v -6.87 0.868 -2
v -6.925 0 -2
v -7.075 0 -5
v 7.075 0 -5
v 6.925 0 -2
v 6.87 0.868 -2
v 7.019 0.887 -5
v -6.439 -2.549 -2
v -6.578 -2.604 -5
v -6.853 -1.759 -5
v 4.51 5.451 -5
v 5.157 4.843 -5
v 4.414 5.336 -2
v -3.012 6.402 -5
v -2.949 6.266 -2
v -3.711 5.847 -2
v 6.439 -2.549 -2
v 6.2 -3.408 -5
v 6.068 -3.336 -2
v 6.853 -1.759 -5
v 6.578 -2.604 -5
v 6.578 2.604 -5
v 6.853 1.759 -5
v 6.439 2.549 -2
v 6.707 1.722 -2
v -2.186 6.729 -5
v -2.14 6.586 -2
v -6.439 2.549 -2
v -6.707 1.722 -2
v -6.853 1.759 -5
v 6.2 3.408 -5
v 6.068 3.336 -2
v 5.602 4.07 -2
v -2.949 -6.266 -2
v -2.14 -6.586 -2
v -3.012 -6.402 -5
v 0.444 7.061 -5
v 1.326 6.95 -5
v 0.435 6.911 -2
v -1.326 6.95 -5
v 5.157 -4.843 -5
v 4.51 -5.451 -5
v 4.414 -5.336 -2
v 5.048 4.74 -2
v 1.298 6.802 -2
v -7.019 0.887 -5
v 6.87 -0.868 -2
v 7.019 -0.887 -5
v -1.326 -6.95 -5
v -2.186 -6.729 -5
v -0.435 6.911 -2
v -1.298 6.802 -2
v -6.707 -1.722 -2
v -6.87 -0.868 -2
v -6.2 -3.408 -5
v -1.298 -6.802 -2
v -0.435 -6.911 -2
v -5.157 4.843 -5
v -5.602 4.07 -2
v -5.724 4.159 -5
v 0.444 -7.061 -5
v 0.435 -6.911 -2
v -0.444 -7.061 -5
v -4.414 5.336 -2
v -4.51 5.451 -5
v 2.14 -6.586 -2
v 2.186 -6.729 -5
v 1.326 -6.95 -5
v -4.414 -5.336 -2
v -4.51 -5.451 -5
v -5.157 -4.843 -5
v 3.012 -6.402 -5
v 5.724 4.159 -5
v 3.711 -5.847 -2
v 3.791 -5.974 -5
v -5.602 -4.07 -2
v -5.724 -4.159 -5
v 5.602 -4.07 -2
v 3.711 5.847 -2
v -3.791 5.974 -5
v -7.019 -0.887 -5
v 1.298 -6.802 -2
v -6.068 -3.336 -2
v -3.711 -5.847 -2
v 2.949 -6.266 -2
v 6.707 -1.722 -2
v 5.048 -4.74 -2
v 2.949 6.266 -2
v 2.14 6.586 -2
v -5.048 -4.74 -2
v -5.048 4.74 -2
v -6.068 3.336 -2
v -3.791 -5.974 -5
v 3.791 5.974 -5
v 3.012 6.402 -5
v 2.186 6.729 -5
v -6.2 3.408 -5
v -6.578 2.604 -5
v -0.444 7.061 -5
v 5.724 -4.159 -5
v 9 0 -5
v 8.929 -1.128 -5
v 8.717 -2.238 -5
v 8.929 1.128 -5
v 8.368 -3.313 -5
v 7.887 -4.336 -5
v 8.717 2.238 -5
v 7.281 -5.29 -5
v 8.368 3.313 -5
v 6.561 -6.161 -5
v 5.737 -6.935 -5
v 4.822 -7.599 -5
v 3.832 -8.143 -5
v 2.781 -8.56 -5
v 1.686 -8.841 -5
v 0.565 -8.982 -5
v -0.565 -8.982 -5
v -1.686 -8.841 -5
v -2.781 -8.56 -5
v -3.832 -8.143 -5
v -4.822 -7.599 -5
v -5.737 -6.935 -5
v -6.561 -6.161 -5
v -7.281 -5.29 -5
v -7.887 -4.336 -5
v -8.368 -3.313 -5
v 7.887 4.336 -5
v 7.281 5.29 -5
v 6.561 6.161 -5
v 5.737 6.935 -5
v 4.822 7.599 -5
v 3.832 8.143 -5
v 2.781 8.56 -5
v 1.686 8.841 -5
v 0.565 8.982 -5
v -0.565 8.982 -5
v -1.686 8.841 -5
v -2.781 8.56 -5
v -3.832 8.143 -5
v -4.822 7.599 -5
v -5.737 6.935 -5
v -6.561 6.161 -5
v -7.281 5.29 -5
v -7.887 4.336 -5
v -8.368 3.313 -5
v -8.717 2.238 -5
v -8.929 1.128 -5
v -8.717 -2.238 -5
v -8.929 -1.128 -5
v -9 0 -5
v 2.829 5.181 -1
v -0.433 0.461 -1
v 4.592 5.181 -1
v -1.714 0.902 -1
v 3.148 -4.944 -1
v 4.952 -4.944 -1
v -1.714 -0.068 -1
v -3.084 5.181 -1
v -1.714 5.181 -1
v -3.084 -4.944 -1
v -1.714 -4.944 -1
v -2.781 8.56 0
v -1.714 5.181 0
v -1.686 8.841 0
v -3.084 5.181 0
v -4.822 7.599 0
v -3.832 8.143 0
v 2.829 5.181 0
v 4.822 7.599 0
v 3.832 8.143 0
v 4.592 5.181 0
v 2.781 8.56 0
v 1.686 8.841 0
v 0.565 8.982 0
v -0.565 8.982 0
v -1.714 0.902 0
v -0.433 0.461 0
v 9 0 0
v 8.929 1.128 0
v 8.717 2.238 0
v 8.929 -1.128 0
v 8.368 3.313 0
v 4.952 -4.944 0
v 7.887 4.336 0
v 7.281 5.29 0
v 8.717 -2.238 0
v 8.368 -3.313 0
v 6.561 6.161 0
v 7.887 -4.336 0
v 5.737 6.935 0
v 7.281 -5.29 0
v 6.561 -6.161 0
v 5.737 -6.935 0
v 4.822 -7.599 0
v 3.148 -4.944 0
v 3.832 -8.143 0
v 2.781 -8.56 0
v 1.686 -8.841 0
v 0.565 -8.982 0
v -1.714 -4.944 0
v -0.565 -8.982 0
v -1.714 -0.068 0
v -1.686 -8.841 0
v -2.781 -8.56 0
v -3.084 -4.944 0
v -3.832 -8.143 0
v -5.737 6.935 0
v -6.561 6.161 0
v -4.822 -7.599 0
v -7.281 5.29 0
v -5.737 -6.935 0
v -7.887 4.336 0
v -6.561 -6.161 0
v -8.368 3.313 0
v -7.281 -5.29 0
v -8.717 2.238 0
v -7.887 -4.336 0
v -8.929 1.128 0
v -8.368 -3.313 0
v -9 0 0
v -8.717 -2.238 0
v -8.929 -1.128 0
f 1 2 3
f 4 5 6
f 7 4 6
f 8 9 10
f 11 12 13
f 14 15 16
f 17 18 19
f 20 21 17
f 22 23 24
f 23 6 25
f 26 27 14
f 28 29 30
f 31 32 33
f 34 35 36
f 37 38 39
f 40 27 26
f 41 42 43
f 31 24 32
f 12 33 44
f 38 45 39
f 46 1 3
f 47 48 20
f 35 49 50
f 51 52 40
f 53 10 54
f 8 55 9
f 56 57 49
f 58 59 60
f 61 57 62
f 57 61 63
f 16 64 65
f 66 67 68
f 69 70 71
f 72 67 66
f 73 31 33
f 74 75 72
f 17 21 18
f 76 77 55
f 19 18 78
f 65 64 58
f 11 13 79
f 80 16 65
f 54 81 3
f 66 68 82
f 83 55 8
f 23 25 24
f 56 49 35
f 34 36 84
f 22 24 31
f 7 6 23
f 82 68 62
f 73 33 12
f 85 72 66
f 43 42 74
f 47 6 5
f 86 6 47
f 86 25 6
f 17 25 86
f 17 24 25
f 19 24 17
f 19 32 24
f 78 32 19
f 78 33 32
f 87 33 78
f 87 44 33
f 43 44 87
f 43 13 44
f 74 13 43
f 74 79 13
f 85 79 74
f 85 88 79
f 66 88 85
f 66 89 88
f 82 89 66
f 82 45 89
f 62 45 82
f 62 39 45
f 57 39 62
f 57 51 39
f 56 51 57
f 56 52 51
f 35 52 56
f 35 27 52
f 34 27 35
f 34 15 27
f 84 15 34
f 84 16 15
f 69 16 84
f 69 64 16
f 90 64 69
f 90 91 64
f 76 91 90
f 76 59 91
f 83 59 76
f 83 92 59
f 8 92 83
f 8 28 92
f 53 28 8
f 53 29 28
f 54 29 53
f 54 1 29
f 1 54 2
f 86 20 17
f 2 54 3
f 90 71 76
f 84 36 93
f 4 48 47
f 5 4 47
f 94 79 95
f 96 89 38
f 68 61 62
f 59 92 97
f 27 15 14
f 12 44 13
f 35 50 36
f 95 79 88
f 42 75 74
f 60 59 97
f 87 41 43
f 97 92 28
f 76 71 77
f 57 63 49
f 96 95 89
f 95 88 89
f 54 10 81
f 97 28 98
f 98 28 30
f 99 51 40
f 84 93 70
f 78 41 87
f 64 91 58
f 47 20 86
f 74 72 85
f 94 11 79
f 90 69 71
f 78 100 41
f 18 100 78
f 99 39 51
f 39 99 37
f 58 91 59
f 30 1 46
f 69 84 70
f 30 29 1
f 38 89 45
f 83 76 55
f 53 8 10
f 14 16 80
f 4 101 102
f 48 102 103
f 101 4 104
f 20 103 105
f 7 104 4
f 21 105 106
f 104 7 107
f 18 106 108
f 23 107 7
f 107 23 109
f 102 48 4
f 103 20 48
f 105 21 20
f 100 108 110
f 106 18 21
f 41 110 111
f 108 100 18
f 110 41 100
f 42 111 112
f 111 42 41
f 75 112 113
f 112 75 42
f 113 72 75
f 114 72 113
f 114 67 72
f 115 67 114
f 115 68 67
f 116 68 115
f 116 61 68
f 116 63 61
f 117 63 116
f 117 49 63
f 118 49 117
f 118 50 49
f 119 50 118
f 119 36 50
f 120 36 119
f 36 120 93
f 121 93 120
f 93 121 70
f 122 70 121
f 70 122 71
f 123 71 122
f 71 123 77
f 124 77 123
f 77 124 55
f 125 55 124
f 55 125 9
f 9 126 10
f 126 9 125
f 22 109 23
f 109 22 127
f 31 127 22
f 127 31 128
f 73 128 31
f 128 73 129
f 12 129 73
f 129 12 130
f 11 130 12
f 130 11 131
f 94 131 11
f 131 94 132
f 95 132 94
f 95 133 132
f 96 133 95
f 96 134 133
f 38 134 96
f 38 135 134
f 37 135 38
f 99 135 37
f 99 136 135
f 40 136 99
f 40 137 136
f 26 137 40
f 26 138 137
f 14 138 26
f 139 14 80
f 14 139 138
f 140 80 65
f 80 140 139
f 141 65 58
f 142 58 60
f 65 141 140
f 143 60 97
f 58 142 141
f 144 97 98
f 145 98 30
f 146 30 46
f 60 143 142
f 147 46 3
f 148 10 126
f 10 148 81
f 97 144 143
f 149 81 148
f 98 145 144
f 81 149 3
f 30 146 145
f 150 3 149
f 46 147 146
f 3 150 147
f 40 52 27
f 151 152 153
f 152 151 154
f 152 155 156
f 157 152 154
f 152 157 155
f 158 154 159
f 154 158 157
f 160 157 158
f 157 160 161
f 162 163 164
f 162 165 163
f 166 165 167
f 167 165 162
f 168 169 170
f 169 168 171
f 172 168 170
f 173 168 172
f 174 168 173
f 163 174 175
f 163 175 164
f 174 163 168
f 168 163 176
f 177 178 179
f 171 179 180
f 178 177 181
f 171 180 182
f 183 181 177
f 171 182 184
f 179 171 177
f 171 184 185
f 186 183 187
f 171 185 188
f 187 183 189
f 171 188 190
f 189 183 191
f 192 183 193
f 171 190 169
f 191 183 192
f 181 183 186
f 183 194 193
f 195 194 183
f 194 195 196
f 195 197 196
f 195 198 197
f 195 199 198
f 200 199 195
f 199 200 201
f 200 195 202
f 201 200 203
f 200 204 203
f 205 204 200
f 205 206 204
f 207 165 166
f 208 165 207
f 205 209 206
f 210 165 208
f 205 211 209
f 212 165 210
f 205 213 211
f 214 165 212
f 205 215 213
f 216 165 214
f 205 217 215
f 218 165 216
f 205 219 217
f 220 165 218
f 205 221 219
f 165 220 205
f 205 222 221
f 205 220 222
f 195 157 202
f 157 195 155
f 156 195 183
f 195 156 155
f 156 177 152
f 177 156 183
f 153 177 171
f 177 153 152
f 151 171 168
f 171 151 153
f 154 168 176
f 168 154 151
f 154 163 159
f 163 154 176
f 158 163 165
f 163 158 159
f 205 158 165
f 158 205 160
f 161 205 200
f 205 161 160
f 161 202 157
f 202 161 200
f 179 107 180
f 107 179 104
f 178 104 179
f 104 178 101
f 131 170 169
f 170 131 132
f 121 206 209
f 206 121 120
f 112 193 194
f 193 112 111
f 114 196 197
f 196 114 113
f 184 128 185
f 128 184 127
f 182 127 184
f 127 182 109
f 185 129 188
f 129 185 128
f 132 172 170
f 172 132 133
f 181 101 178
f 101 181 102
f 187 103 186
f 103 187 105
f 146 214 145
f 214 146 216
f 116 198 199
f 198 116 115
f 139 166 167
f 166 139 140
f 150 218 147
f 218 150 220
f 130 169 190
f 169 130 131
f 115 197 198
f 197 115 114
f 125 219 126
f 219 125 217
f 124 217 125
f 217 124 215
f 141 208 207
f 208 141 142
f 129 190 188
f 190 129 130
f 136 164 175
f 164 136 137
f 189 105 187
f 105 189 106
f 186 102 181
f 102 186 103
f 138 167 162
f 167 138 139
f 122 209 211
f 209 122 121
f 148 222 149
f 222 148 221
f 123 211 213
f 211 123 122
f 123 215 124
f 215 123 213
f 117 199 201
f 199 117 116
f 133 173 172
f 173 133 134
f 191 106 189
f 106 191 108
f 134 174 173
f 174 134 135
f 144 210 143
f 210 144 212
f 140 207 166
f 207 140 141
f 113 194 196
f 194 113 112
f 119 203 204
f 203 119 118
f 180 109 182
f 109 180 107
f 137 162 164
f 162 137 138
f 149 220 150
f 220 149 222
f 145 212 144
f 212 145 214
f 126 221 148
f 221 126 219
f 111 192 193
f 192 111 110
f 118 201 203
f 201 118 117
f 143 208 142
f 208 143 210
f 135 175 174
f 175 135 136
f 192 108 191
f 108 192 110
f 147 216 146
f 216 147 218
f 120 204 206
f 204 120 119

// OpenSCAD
$fn = 50;

difference() {
	union() {
		translate(v = [0, 0, -5.0]) {
			cylinder(h = 5, r = 9.0);
		}
	}
	union() {
		#translate(v = [0, 0, -5.0]) {
			cylinder(h = 3, r1 = 7.075, r2 = 6.925);
		}
		translate(v = [0, 0, -1]) {
			linear_extrude(height = 1) {
				text(font = "Impact", halign = "center", size = 10, text = "K", valign = "center");
			}
		}
	}
}
